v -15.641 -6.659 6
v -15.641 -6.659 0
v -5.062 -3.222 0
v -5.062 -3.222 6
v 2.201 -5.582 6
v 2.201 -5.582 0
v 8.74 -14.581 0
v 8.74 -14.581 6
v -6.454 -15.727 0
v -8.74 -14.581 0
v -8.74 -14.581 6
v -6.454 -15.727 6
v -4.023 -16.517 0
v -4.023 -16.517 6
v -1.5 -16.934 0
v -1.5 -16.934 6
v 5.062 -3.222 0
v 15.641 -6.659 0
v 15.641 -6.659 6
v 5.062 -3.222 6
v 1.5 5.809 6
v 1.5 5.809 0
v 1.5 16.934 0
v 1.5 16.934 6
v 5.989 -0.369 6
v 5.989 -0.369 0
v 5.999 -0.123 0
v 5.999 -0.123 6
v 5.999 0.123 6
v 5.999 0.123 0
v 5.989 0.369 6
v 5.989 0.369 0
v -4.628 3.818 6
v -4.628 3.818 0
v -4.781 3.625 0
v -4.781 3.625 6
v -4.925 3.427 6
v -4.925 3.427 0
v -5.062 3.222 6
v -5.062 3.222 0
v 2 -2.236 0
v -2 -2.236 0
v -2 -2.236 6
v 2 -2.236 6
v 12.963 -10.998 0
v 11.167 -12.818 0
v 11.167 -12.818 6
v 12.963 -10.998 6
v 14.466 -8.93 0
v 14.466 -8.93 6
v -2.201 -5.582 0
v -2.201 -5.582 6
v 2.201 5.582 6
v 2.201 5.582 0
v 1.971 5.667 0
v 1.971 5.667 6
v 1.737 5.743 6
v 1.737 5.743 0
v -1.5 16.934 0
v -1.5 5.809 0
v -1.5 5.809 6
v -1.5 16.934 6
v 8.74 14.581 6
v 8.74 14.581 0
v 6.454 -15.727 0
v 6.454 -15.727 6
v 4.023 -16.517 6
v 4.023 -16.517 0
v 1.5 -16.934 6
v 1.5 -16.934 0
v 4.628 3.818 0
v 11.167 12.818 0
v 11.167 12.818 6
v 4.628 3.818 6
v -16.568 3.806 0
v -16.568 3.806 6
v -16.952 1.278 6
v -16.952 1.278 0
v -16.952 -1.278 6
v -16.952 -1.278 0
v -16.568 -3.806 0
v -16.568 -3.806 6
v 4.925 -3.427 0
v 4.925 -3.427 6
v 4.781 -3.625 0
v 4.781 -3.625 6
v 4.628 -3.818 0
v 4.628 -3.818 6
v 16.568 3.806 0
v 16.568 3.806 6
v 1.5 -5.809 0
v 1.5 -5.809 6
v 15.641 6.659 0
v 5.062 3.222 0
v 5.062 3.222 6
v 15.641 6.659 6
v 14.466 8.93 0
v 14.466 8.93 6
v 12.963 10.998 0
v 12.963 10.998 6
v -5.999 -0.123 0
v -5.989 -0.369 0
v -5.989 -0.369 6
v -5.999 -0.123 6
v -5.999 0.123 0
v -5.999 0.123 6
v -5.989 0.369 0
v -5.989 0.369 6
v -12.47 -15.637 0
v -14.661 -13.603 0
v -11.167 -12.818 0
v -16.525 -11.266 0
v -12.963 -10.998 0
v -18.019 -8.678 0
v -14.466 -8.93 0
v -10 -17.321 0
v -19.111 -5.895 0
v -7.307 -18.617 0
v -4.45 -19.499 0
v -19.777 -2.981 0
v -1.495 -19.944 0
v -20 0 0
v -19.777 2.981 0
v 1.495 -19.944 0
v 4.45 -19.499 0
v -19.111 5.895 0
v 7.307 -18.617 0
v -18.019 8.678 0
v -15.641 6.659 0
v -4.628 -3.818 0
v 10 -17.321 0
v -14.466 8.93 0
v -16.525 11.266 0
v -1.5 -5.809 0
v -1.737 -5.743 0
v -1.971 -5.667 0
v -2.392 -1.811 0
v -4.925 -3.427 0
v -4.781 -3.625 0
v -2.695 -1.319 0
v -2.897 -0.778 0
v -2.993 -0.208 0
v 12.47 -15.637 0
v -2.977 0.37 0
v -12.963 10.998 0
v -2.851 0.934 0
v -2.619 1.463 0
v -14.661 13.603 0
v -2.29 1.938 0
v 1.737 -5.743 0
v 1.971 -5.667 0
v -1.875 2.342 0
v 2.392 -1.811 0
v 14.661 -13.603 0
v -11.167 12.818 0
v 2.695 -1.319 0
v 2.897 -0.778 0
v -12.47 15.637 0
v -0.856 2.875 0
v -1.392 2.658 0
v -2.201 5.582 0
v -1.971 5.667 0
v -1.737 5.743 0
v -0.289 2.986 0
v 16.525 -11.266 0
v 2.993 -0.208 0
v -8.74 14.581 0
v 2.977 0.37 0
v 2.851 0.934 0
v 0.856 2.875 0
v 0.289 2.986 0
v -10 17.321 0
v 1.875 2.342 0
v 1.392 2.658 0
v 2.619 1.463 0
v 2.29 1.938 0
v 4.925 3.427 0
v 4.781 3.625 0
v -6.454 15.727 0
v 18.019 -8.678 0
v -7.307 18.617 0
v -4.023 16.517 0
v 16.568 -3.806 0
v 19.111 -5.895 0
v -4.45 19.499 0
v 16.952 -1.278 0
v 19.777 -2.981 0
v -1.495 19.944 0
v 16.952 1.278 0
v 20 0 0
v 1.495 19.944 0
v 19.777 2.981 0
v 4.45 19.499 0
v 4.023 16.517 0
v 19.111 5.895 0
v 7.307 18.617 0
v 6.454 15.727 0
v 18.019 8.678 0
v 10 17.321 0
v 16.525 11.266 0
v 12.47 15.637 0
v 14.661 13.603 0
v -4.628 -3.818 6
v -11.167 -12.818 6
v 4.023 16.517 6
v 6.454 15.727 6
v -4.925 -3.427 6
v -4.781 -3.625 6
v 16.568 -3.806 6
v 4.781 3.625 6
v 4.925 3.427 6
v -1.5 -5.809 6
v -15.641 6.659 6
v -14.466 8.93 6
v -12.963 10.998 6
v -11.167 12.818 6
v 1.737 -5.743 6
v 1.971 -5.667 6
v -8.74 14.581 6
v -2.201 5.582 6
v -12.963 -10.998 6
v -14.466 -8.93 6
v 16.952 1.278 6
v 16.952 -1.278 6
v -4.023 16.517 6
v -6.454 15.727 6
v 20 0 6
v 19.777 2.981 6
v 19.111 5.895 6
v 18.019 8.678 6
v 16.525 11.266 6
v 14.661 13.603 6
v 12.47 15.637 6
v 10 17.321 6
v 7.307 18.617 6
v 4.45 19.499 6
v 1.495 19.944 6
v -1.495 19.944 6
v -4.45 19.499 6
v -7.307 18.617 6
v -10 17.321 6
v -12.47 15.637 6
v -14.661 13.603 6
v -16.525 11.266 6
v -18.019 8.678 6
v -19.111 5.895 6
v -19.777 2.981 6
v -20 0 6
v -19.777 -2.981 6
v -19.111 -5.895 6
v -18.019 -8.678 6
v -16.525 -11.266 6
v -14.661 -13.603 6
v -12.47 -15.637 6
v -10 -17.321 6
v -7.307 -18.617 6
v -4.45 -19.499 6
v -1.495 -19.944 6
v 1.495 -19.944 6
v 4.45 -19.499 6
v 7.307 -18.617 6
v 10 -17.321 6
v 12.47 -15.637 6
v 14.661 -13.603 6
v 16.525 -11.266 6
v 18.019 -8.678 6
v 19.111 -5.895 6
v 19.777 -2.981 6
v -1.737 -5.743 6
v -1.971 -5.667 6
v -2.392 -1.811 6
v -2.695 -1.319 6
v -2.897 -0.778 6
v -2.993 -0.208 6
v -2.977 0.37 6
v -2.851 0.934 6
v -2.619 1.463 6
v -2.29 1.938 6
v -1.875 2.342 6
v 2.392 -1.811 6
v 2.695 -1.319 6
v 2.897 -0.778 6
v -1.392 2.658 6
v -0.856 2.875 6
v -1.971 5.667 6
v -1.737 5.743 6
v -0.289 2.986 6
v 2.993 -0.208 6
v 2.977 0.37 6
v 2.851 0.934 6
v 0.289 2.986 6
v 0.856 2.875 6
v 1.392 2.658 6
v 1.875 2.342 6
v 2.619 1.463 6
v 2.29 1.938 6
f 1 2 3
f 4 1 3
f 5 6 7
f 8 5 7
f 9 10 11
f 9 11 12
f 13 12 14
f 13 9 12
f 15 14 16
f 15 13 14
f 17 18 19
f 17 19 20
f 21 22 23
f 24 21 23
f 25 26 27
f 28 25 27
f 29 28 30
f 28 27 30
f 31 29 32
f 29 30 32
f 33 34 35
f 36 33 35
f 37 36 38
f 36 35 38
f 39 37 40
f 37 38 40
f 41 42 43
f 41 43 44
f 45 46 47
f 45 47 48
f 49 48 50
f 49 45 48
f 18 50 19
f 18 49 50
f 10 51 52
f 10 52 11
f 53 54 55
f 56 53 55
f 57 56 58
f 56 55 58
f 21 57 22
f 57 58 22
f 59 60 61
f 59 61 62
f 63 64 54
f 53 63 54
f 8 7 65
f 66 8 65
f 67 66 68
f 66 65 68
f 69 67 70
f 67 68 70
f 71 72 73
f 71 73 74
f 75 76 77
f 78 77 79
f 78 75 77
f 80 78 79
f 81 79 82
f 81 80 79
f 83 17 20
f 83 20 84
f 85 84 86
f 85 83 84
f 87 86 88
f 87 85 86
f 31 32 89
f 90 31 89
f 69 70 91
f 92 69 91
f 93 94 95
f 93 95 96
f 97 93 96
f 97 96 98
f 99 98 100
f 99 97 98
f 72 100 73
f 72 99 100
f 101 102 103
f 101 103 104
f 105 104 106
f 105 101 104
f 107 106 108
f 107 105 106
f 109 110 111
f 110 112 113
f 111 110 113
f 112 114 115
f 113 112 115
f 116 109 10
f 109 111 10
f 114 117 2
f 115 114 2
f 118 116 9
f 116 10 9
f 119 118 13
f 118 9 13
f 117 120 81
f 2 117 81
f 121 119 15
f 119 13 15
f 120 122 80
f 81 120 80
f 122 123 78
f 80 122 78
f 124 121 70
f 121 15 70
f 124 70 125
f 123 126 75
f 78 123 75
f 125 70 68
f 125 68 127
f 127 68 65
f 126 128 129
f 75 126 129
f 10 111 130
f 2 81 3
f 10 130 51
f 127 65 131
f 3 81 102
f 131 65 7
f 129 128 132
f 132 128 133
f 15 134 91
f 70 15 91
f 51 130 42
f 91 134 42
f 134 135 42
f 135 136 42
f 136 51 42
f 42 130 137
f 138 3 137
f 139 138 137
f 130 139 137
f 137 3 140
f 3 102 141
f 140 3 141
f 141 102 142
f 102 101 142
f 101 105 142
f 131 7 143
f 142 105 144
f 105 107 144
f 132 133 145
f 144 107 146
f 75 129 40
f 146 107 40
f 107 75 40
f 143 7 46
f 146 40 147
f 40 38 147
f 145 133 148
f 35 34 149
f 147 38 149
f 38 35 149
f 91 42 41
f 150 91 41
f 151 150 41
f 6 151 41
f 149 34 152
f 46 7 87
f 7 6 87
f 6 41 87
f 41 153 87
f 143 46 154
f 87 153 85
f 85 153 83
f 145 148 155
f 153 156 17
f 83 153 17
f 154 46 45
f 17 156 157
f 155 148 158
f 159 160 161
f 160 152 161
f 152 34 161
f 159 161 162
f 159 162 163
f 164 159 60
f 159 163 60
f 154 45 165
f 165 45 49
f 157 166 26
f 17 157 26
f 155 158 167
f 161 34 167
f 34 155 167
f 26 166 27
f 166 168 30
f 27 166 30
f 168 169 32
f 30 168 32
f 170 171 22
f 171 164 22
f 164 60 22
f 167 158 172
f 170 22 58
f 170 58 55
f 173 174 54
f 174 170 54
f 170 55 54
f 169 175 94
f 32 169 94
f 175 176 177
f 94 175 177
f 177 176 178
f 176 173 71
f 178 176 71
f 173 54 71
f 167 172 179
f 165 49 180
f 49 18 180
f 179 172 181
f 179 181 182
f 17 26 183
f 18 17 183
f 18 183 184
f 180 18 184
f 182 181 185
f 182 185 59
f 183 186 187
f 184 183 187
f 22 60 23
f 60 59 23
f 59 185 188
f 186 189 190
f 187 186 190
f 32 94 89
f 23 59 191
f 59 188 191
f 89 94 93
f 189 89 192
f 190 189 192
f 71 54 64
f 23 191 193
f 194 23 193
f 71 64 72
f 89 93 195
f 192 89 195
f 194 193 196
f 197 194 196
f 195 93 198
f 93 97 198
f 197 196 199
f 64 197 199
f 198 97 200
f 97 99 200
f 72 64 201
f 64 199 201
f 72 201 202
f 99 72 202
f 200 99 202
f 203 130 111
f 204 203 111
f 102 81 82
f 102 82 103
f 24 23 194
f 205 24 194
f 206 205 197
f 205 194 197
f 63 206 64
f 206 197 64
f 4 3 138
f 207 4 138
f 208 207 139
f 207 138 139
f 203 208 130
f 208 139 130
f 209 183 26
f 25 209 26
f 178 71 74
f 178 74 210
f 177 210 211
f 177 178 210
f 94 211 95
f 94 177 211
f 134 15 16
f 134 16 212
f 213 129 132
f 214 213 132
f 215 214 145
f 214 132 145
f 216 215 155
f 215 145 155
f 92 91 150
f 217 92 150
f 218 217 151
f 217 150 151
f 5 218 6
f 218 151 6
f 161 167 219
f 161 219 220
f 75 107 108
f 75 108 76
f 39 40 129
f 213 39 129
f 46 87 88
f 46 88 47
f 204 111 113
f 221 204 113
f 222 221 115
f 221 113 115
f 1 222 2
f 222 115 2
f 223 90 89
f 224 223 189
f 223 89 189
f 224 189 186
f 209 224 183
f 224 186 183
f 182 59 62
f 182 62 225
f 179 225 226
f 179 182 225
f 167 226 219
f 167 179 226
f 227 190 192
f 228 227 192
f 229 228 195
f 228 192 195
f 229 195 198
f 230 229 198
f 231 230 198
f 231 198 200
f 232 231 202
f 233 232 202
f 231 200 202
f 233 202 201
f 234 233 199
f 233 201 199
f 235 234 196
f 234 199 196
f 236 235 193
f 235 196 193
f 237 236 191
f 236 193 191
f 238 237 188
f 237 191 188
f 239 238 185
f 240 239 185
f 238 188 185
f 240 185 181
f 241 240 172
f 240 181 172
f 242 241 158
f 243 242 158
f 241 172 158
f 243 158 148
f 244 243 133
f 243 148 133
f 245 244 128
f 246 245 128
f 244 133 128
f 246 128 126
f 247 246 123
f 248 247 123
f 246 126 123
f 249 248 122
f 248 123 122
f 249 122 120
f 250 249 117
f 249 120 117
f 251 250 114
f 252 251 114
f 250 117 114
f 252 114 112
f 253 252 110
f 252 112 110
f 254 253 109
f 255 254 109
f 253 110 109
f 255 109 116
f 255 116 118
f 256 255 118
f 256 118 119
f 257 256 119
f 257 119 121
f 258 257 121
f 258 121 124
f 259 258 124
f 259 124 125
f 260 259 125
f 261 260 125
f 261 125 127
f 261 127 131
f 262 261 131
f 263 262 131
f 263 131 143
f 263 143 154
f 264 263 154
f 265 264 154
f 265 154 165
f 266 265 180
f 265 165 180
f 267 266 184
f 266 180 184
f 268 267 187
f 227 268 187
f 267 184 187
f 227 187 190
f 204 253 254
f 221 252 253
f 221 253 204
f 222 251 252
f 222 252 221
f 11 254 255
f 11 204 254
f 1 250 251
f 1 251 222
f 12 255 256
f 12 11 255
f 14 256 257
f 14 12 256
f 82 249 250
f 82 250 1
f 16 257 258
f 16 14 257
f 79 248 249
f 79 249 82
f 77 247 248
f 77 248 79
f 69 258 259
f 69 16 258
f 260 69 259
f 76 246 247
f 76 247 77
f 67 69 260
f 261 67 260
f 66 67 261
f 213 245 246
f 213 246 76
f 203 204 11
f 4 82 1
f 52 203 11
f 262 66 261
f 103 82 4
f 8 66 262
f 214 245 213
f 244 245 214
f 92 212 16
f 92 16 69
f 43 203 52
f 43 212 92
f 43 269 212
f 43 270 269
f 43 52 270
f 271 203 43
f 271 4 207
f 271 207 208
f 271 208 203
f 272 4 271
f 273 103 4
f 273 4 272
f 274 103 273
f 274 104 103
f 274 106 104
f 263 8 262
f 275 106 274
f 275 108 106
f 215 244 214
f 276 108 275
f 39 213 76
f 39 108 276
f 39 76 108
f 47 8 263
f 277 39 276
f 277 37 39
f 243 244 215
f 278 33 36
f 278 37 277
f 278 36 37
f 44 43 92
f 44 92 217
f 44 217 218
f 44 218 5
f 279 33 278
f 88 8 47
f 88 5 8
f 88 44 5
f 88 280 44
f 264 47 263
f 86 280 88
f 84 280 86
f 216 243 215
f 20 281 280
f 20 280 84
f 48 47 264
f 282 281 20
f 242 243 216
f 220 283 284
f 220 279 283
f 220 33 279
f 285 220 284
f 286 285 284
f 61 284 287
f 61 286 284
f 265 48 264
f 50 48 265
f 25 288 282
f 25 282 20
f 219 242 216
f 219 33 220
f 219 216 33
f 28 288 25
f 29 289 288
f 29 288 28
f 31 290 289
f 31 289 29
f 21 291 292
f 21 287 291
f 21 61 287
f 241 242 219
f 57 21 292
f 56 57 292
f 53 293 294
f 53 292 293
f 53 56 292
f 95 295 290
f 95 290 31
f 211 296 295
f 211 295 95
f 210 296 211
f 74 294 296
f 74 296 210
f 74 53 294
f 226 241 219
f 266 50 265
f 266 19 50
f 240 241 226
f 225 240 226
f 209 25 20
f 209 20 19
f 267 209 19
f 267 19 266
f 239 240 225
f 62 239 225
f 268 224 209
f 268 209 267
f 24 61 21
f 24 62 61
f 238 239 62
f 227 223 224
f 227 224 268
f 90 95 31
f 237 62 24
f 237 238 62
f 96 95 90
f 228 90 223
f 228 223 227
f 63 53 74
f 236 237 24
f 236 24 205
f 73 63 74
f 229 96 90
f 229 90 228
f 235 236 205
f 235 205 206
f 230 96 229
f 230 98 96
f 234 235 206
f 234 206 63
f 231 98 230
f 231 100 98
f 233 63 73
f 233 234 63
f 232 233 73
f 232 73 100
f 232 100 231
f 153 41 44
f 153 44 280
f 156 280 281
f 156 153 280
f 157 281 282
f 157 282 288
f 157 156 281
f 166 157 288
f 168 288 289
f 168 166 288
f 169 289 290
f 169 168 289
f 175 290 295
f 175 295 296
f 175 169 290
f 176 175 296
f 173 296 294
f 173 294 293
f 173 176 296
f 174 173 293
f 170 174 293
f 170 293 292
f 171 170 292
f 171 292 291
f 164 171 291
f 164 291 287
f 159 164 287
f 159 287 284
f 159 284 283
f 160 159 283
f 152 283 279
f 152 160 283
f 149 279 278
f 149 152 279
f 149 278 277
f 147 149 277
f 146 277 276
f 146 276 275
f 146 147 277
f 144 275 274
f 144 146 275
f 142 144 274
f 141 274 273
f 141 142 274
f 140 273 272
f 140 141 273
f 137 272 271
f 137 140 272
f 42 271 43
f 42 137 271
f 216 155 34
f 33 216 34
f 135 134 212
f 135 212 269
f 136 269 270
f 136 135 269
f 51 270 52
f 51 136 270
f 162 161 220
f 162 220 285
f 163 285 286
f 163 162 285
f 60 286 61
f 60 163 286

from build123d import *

# Parameters (mm, degrees)
SKETCH1_R           = 20
BOSS_EXTRUDE1_DEPTH = 6


with BuildPart() as part:
    # Sketch1 → Boss-Extrude1 (new body)
    with BuildSketch(Plane.XY):
        Circle(SKETCH1_R)
        with BuildLine():
            Line((-2, -2.236067977), (2, -2.236067977))
            ThreePointArc((2, -2.236067977), (0, 3), (-2, -2.236067977))
        make_face(mode=Mode.SUBTRACT)
        with BuildLine():
            Line((-16.568425726, -3.806214518), (-5.988664565, -0.368641735))
            ThreePointArc((-5.988664565, -0.368641735), (-6, 0), (-5.988664565, 0.368641735))
            Line((-5.988664565, 0.368641735), (-16.568425726, 3.806214518))
            ThreePointArc((-16.568425726, 3.806214518), (-17, 0), (-16.568425726, -3.806214518))
        make_face(mode=Mode.SUBTRACT)
        with BuildLine():
            Line((-1.5, -16.933694222), (-1.5, -5.809475019))
            ThreePointArc((-1.5, -5.809475019), (-1.854101966, -5.706339098), (-2.201198248, -5.581641897))
            Line((-2.201198248, -5.581641897), (-8.739850239, -14.581324281))
            ThreePointArc((-8.739850239, -14.581324281), (-5.253288904, -16.167960777), (-1.5, -16.933694222))
        make_face(mode=Mode.SUBTRACT)
        with BuildLine():
            Line((1.5, -16.933694222), (1.5, -5.809475019))
            ThreePointArc((1.5, -5.809475019), (1.854101966, -5.706339098), (2.201198248, -5.581641897))
            Line((2.201198248, -5.581641897), (8.739850239, -14.581324281))
            ThreePointArc((8.739850239, -14.581324281), (5.253288904, -16.167960777), (1.5, -16.933694222))
        make_face(mode=Mode.SUBTRACT)
        with BuildLine():
            Line((-1.5, 5.809475019), (-1.5, 16.933694222))
            ThreePointArc((-1.5, 16.933694222), (-5.253288904, 16.167960777), (-8.739850239, 14.581324281))
            Line((-8.739850239, 14.581324281), (-2.201198248, 5.581641897))
            ThreePointArc((-2.201198248, 5.581641897), (-1.854101966, 5.706339098), (-1.5, 5.809475019))
        make_face(mode=Mode.SUBTRACT)
        with BuildLine():
            Line((-5.061613582, 3.221811284), (-15.641374743, 6.659384067))
            ThreePointArc((-15.641374743, 6.659384067), (-13.753288904, 9.992349289), (-11.166901222, 12.817968525))
            Line((-11.166901222, 12.817968525), (-4.628249231, 3.818286141))
            ThreePointArc((-4.628249231, 3.818286141), (-4.854101966, 3.526711514), (-5.061613582, 3.221811284))
        make_face(mode=Mode.SUBTRACT)
        with BuildLine():
            Line((-15.641374743, -6.659384067), (-5.061613582, -3.221811284))
            ThreePointArc((-5.061613582, -3.221811284), (-4.854101966, -3.526711514), (-4.628249231, -3.818286141))
            Line((-4.628249231, -3.818286141), (-11.166901222, -12.817968525))
            ThreePointArc((-11.166901222, -12.817968525), (-13.753288904, -9.992349289), (-15.641374743, -6.659384067))
        make_face(mode=Mode.SUBTRACT)
        with BuildLine():
            Line((11.166901222, 12.817968525), (4.628249231, 3.818286141))
            ThreePointArc((4.628249231, 3.818286141), (4.854101966, 3.526711514), (5.061613582, 3.221811284))
            Line((5.061613582, 3.221811284), (15.641374743, 6.659384067))
            ThreePointArc((15.641374743, 6.659384067), (13.753288904, 9.992349289), (11.166901222, 12.817968525))
        make_face(mode=Mode.SUBTRACT)
        with BuildLine():
            Line((8.739850239, 14.581324281), (2.201198248, 5.581641897))
            ThreePointArc((2.201198248, 5.581641897), (1.854101966, 5.706339098), (1.5, 5.809475019))
            Line((1.5, 5.809475019), (1.5, 16.933694222))
            ThreePointArc((1.5, 16.933694222), (5.253288904, 16.167960777), (8.739850239, 14.581324281))
        make_face(mode=Mode.SUBTRACT)
        with BuildLine():
            Line((15.641374743, -6.659384067), (5.061613582, -3.221811284))
            ThreePointArc((5.061613582, -3.221811284), (4.854101966, -3.526711514), (4.628249231, -3.818286141))
            Line((4.628249231, -3.818286141), (11.166901222, -12.817968525))
            ThreePointArc((11.166901222, -12.817968525), (13.753288904, -9.992349289), (15.641374743, -6.659384067))
        make_face(mode=Mode.SUBTRACT)
        with BuildLine():
            Line((16.568425726, -3.806214518), (5.988664565, -0.368641735))
            ThreePointArc((5.988664565, -0.368641735), (6, 0), (5.988664565, 0.368641735))
            Line((5.988664565, 0.368641735), (16.568425726, 3.806214518))
            ThreePointArc((16.568425726, 3.806214518), (17, 0), (16.568425726, -3.806214518))
        make_face(mode=Mode.SUBTRACT)
    extrude(amount=BOSS_EXTRUDE1_DEPTH)


solid = part.part
